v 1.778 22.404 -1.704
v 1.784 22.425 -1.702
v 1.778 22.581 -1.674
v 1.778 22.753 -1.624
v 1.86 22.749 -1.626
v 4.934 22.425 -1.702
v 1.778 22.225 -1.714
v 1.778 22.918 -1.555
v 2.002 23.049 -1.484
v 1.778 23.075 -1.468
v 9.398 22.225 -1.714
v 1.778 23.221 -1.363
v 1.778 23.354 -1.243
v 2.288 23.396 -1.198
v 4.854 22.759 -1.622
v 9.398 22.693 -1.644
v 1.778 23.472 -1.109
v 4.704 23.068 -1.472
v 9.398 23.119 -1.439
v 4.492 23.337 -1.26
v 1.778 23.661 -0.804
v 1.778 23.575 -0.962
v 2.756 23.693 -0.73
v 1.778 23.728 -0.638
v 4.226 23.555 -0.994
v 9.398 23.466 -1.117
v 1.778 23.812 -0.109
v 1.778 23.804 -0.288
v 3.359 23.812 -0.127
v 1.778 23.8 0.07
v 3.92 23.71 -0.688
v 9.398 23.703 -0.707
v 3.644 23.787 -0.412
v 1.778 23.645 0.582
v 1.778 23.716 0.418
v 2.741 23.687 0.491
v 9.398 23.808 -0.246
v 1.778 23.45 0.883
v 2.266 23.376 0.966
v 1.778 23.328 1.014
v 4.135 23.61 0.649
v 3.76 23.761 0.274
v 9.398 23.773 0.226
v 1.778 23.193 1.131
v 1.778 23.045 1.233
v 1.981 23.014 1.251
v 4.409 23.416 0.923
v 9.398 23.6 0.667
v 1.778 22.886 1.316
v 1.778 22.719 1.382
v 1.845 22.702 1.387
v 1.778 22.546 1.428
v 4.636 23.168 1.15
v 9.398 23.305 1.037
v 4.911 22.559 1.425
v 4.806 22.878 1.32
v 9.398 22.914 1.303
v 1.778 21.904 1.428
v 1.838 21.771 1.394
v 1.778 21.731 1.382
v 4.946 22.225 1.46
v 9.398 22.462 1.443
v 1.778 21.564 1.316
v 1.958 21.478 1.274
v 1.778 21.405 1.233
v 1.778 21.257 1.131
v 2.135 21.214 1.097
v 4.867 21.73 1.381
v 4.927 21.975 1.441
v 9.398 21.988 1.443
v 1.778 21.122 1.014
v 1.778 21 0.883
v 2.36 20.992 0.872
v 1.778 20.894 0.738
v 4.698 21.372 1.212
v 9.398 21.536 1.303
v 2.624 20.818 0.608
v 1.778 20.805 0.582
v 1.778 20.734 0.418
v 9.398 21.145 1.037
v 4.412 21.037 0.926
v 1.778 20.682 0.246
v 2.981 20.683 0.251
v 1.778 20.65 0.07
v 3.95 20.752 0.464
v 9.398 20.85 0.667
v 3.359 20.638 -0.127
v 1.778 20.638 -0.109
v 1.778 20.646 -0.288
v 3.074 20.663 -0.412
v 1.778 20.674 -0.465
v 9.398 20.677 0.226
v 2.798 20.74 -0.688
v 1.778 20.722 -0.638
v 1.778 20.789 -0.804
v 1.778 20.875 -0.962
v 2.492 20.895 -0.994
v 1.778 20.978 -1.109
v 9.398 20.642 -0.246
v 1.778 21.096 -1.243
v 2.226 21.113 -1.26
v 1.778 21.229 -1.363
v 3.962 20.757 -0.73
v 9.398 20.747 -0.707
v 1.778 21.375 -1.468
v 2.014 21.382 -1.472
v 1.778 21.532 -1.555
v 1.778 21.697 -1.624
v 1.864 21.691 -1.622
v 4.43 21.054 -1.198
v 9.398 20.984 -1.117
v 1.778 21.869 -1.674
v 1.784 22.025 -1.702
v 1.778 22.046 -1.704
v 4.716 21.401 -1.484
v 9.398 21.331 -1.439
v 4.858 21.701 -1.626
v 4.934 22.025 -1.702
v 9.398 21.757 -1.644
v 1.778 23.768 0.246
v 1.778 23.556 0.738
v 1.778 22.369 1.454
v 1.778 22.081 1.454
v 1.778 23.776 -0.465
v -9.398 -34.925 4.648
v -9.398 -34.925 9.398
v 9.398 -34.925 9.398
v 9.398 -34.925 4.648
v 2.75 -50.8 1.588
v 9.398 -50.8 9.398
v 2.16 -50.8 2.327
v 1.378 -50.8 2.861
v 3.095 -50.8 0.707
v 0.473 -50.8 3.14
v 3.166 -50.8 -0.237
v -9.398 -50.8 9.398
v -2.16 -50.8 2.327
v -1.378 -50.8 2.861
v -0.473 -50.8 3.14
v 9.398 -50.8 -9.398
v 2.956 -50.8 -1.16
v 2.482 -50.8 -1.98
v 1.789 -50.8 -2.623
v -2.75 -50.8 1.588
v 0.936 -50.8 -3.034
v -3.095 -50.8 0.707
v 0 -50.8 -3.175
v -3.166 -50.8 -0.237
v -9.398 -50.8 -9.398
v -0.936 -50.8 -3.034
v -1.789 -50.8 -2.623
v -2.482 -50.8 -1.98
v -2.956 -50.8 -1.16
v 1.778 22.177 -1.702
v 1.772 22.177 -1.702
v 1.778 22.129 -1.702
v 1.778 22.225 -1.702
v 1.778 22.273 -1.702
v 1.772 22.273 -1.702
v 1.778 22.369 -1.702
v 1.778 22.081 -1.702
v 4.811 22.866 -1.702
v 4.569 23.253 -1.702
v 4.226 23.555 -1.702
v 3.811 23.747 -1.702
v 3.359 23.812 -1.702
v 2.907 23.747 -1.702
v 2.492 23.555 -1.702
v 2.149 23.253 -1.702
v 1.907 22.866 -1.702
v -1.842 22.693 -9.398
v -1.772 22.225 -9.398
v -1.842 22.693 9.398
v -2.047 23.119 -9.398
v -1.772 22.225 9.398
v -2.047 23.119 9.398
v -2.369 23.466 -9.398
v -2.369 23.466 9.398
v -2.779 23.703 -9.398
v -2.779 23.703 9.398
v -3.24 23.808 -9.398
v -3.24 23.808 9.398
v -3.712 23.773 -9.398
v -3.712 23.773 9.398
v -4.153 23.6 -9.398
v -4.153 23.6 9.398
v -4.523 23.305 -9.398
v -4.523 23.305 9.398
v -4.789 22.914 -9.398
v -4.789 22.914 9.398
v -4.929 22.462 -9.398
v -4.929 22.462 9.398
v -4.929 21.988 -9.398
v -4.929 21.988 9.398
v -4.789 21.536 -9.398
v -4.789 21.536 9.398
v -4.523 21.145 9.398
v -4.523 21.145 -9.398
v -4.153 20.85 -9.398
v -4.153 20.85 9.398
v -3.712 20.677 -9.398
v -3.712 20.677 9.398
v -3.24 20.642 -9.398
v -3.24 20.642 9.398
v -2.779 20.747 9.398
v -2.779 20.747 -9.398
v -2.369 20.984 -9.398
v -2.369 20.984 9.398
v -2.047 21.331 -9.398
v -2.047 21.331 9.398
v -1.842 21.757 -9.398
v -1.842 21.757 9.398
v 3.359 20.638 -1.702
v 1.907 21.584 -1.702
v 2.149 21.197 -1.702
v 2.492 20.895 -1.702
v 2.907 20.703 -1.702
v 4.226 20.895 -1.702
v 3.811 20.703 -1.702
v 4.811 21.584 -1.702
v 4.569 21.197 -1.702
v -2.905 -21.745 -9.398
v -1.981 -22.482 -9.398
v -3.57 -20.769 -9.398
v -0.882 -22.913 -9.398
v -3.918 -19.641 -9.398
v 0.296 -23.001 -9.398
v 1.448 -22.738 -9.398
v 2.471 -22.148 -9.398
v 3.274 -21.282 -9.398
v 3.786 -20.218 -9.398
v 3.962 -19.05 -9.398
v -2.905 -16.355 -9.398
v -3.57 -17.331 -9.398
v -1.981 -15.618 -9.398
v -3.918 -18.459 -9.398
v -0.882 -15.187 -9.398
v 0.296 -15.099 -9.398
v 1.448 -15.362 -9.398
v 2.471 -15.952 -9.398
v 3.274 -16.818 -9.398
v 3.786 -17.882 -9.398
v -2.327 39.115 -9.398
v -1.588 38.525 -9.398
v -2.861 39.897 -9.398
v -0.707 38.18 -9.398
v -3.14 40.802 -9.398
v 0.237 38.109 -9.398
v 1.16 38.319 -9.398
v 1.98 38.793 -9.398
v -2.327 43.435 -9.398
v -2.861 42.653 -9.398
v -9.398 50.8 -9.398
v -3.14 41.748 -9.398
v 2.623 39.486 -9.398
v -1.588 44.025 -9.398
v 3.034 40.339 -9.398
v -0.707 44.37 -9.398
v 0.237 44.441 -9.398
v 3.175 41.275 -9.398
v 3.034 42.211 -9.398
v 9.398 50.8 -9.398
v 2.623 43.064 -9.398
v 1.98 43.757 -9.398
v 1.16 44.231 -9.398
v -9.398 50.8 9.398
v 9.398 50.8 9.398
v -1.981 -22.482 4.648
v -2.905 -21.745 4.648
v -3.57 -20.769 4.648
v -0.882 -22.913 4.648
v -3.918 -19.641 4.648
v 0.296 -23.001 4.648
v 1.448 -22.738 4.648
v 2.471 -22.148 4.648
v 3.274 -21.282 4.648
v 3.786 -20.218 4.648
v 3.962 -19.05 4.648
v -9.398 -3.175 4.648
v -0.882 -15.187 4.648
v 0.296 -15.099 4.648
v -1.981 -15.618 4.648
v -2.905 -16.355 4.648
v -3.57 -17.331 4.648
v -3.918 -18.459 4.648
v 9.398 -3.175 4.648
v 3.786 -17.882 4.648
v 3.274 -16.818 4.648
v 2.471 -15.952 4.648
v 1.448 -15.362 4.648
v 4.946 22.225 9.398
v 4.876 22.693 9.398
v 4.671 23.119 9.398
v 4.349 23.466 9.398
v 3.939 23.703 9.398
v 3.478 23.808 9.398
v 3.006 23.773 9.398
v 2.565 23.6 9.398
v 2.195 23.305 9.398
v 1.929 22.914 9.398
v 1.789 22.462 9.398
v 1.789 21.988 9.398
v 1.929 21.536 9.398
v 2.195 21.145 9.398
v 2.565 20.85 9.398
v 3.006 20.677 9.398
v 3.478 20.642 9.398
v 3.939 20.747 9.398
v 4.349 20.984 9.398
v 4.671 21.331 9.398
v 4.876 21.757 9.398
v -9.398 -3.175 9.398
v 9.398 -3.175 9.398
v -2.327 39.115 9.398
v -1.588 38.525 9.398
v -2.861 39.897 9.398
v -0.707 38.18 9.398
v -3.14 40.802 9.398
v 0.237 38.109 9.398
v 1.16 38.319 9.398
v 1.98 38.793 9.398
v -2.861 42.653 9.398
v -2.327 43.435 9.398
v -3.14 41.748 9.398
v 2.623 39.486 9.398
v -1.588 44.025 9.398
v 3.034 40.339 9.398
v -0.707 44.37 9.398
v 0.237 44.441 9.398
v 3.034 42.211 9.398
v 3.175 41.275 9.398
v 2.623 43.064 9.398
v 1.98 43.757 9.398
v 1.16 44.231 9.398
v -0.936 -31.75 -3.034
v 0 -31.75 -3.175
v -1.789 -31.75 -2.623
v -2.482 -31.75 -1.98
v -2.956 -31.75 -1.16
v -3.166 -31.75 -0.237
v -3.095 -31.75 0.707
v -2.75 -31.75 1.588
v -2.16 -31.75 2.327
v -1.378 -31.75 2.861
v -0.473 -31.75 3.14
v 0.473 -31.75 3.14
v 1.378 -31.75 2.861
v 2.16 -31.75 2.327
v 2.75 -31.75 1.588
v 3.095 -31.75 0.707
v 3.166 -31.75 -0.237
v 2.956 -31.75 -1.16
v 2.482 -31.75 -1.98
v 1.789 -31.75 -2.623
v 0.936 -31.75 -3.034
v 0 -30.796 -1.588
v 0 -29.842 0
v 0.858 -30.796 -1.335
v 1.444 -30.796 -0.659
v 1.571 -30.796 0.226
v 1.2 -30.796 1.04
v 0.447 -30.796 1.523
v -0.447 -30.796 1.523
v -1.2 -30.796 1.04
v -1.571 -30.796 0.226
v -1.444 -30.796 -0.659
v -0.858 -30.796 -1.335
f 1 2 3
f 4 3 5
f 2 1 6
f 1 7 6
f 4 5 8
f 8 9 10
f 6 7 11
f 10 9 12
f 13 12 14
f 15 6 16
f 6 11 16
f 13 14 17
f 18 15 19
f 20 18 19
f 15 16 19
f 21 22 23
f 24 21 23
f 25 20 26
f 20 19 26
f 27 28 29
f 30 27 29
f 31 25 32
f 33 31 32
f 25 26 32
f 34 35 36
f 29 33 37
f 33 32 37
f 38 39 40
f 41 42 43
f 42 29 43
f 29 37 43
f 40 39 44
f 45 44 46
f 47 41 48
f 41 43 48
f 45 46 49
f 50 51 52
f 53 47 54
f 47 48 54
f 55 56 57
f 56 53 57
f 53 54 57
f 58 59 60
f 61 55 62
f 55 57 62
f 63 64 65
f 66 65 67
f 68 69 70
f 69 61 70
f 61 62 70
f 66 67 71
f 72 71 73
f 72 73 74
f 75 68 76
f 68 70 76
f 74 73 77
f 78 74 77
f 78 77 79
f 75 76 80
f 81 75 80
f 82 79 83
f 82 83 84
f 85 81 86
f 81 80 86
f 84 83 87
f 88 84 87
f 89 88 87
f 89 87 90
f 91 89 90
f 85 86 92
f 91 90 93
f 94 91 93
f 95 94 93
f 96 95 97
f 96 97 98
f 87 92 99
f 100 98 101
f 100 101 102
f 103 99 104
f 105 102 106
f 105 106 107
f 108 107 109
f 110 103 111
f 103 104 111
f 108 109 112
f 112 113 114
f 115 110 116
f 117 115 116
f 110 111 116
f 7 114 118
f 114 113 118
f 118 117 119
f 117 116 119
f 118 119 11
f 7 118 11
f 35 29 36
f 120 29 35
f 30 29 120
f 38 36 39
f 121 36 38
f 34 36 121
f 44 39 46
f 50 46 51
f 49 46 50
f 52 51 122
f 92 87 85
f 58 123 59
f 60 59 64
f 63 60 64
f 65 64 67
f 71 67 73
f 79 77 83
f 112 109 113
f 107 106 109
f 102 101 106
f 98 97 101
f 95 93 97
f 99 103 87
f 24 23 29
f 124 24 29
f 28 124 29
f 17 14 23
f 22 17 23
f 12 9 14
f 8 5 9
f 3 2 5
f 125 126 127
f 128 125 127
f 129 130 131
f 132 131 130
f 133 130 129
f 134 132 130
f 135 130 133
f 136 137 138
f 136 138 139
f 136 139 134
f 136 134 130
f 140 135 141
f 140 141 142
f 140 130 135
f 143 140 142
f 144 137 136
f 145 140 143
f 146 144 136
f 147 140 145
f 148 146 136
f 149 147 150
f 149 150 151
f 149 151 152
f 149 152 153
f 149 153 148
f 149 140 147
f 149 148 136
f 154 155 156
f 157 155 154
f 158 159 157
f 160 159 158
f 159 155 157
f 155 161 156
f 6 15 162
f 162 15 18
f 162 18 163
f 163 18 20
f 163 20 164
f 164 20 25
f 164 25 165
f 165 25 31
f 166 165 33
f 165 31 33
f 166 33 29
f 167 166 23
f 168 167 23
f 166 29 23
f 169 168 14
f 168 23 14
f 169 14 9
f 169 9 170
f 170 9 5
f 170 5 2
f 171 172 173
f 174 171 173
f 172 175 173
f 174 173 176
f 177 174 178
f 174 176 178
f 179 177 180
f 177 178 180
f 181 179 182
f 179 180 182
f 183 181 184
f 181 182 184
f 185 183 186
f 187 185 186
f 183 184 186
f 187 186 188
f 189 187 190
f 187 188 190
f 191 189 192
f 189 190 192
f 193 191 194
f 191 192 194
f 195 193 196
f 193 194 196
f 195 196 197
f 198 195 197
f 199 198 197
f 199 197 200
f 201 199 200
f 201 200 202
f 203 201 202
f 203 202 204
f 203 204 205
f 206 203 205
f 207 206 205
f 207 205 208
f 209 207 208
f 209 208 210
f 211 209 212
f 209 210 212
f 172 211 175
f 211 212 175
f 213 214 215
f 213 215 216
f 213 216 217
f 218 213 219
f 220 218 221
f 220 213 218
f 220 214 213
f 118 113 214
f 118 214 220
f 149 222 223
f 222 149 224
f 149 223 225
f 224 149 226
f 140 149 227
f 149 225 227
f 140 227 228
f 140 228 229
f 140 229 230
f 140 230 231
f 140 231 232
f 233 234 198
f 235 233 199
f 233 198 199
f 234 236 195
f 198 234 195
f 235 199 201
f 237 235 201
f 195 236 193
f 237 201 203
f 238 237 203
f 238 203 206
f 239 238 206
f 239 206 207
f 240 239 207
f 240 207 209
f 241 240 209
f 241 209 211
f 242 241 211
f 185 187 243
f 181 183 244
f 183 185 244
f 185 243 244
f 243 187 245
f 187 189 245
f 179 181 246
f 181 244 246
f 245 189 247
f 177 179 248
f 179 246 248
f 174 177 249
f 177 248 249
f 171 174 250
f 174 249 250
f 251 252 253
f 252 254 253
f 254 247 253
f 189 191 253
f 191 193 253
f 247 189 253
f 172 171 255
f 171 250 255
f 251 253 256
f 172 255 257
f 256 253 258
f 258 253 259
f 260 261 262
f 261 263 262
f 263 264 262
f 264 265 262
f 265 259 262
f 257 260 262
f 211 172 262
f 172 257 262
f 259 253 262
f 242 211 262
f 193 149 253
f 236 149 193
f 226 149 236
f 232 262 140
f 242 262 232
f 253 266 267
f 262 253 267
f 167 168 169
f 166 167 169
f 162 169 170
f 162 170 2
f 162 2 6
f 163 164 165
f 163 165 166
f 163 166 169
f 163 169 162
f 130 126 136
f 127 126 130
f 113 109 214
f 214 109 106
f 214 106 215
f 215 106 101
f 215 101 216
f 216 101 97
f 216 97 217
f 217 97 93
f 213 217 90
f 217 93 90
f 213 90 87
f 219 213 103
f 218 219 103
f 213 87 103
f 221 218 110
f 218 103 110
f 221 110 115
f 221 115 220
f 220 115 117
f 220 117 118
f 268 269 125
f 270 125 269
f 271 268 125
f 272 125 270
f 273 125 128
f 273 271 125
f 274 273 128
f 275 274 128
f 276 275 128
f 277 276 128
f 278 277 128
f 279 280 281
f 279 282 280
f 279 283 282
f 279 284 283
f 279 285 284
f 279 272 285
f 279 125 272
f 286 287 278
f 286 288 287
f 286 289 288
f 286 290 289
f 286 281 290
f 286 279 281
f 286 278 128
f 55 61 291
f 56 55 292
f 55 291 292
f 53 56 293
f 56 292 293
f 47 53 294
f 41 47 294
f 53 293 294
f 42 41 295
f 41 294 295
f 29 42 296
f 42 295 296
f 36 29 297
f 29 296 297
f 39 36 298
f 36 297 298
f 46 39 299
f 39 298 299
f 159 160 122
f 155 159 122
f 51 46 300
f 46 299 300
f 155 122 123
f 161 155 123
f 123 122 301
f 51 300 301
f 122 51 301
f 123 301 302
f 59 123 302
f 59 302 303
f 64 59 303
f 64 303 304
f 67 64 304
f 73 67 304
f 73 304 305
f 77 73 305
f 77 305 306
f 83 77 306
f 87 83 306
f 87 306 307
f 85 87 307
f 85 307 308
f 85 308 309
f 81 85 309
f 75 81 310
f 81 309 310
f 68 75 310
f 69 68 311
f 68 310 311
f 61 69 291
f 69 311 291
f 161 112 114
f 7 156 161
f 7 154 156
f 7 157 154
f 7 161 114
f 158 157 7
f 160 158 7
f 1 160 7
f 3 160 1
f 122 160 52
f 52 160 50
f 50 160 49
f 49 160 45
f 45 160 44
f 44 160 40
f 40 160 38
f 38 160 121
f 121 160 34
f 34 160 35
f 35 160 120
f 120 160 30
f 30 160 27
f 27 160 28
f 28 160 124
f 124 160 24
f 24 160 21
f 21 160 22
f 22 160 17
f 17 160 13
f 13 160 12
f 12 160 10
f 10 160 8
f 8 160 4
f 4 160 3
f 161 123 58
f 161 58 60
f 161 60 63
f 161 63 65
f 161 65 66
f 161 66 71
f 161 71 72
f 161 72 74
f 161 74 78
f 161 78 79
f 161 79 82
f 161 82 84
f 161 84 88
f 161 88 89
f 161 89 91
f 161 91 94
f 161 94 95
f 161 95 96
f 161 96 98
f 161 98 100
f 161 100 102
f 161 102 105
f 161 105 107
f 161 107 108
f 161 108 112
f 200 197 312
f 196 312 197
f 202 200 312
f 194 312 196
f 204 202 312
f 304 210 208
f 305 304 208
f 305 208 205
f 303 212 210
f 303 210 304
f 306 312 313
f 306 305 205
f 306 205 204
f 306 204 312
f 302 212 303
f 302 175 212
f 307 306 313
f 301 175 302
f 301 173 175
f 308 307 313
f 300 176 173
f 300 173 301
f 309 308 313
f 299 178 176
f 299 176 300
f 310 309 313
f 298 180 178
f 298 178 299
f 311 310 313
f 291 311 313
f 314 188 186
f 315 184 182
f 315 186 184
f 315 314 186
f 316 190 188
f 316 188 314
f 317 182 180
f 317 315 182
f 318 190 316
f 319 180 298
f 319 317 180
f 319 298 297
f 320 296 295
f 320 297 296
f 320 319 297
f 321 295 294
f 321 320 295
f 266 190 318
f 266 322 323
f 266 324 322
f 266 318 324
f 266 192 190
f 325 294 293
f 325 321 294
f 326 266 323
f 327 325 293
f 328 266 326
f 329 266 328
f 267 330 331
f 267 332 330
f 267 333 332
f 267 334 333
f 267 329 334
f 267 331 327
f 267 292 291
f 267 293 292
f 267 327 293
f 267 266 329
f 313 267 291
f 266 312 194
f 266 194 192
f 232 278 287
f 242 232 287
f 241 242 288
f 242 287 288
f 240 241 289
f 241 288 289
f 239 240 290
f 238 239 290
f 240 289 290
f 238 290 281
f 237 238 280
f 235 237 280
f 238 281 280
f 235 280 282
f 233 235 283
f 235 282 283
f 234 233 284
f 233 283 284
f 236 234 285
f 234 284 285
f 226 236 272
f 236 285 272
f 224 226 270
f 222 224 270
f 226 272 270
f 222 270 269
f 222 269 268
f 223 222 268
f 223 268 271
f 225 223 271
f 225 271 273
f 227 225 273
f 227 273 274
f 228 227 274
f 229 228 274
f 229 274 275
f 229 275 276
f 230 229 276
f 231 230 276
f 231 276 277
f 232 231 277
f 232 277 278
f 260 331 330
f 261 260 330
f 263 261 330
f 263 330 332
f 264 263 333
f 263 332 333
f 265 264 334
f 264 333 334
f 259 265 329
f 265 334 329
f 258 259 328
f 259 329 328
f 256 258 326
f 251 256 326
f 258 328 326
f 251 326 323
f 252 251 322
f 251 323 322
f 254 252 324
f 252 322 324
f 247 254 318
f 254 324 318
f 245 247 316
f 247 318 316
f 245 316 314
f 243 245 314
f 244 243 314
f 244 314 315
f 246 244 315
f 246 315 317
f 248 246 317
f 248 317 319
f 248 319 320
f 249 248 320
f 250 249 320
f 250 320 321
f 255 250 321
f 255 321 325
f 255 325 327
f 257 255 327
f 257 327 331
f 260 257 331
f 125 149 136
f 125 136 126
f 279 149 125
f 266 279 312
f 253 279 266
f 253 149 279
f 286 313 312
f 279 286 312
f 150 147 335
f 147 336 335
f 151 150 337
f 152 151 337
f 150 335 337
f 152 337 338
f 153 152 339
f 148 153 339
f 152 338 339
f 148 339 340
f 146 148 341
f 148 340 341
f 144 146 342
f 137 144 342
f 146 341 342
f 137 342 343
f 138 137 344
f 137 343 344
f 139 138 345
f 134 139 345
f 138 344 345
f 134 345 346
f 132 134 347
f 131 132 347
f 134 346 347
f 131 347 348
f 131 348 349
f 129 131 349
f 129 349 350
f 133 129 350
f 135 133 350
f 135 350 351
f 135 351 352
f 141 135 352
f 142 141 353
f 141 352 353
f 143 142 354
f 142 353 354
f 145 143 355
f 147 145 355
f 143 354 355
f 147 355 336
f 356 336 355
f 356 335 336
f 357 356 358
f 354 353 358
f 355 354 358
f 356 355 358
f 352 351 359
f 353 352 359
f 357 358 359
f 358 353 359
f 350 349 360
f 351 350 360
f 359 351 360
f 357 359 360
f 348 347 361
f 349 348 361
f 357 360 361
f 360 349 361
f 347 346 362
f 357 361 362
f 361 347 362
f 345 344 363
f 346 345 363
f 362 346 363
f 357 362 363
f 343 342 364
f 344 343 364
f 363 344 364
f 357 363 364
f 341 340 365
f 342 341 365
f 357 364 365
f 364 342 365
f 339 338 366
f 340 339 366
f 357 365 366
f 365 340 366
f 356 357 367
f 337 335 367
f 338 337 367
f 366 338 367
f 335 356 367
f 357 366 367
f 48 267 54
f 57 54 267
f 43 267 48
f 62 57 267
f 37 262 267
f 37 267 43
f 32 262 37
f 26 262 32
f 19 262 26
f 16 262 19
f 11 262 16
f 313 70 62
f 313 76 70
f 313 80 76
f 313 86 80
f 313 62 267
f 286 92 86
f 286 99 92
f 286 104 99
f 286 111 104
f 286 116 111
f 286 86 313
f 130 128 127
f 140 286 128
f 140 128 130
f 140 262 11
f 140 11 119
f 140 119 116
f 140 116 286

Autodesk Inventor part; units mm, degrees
ref_plane "YZ Plane" through (0, 0, 0) normal (1, 0, 0) x (0, 1, 0)
ref_plane "XZ Plane" through (0, 0, 0) normal (0, 1, 0) x (-1, 0, 0)
ref_plane "XY Plane" through (0, 0, 0) normal (0, 0, 1) x (1, 0, 0)
sketch "Sketch1" plane through (0, 0, 0) normal (0, 0, 1) x (1, 0, 0)
  line L0 (-9.398, 50.8) -> (9.398, 50.8)
  line L1 (9.398, 50.8) -> (9.398, -50.8)
  line L2 (9.398, -50.8) -> (-9.398, -50.8)
  line L3 (-9.398, -50.8) -> (-9.398, 50.8)
  line L4 (-9.398, 50.8) -> (9.398, -50.8) construction
  line L5 (9.398, 50.8) -> (-9.398, -50.8) construction
  point P0 (0, 0)
  dimension "d0" = 18.796
  dimension "d1" = 101.6
extrude "Extrusion1" add sketch "Sketch1" along normal mid plane 18.796
sketch "Sketch2" plane through (0, 0, 9.398) normal (0, 0, 1) x (1, 0, 0)
  line L0 (9.398, -50.8) -> (9.398, 50.8) projected
  line L1 (-9.398, -34.925) -> (9.398, -34.925)
  line L2 (9.398, -34.925) -> (9.398, -3.175)
  line L3 (9.398, -3.175) -> (-9.398, -3.175)
  line L4 (-9.398, -3.175) -> (-9.398, -34.925)
  line L5 (-9.398, -34.925) -> (9.398, -3.175) construction
  line L6 (9.398, -34.925) -> (-9.398, -3.175) construction
  line L7 (-9.398, -50.8) -> (9.398, -50.8) projected
  point P0 (0, 0)
  point P1 (0, -19.05)
  dimension "d4" = 31.75
  dimension "d5" = 15.875
  dimension "d6" = 18.796
extrude "Extrusion3" cut sketch "Sketch2" against normal blind 4.7498
sketch "Sketch3" plane through (0, 0, 4.6482) normal (0, 0, 1) x (1, 0, 0)
  circle A0 centre (0, -19.05) radius 3.9624
  line L0 (9.398, -34.925) -> (-9.398, -34.925) projected
  line L1 (9.398, -3.175) -> (9.398, -34.925) projected
  point P0 (0, 0)
  dimension "d11" = 7.9248
  dimension "d12" = 15.875
  dimension "d13" = 9.398
extrude "Extrusion4" cut sketch "Sketch3" against normal blind 15.24
sketch "Sketch4" plane through (0, 0, 9.398) normal (0, 0, 1) x (1, 0, 0)
  circle A0 centre (0, 41.275) radius 3.175
  line L0 (9.398, 50.8) -> (-9.398, 50.8) projected
  line L1 (9.398, -3.175) -> (9.398, 50.8) projected
  point P0 (0, 0)
  dimension "d16" = 6.35
  dimension "d17" = 9.525
  dimension "d18" = 9.398
extrude "Extrusion5" cut sketch "Sketch4" against normal blind 20.32
sketch "Sketch5" plane through (0, 0, 9.398) normal (0, 0, 1) x (1, 0, 0)
  circle A0 centre (-3.359, 22.225) radius 1.5875
  circle A1 centre (3.359, 22.225) radius 1.5875
  line L0 (9.398, 50.8) -> (-9.398, 50.8) projected
  line L1 (-9.398, 50.8) -> (9.398, 50.8) projected
  line L2 (0, 50.8) -> (0, -50.8) construction
  line L3 (9.398, -50.8) -> (-9.398, -50.8) projected
  circle A2 centre (0, 41.275) radius 3.175 projected
  line L4 (0, 41.275) -> (3.359, 22.225) construction
  line L5 (0, 41.275) -> (-3.359, 22.225) construction
  point P0 (0, 0)
  dimension "d21" = 3.175
  dimension "d22" = 3.175
  dimension "d23" = 28.575
  dimension "d24" = 28.575
  dimension "d25" = 10
  dimension "d26" = 10
extrude "Extrusion6" cut sketch "Sketch5" against normal blind 20.32 contours A0
sketch "Sketch6" plane through (0, 0, 9.398) normal (0, 0, 1) x (1, 0, 0)
  circle A0 centre (-3.359, 22.225) radius 1.5875 projected
  circle A1 centre (0, 41.275) radius 3.175 projected
  circle A2 centre (3.359, 22.225) radius 1.5875
  line L0 (0, 41.275) -> (3.359, 22.225) construction
  line L1 (0, 41.275) -> (0, 8.045) construction
  line L2 (9.398, 50.8) -> (-9.398, 50.8) projected
  point P0 (0, 0)
  dimension "d29" = 3.175
  dimension "d31" = 10
  dimension "d32" = 28.575
extrude "Extrusion7" cut sketch "Sketch6" against normal blind 11.0998 contours A2
sketch "Sketch7" plane through (9.398, -50.8, -9.398) normal (1, 0, 0) x (0, 0, -1)
  line L0 (-18.796, 71.4375) -> (-18.796, 74.6125) projected
  circle A0 centre (-9.271, 73.025) radius 1.5875
  line L1 (0, 101.6) -> (0, 0) projected
  line L2 (-18.796, 101.6) -> (0, 101.6) projected
  point P0 (-9.398, 50.8)
  dimension "d35" = 3.175
  dimension "d36" = 9.271
  dimension "d37" = 28.575
extrude "Extrusion8" cut sketch "Sketch7" against normal blind 7.62
sketch "Sketch9" plane through (-9.398, -50.8, 9.398) normal (0, -1, 0) x (1, 0, 0)
  point P0 (9.398, -9.398)
  point P1 (9.398, -9.398)
hole "Hole1" at (0, -50.8, 0) direction (0, 1, 0) diameter 6.35 depth 19.05 tip angle 118
thread "Thread1" size "1/4-20 UNC" class "2B" standard "ANSI Unified Screw Threads" full length
equation "\"d24\" = d23"
equation "\"d26\" = d25"
properties part number "Standard"
